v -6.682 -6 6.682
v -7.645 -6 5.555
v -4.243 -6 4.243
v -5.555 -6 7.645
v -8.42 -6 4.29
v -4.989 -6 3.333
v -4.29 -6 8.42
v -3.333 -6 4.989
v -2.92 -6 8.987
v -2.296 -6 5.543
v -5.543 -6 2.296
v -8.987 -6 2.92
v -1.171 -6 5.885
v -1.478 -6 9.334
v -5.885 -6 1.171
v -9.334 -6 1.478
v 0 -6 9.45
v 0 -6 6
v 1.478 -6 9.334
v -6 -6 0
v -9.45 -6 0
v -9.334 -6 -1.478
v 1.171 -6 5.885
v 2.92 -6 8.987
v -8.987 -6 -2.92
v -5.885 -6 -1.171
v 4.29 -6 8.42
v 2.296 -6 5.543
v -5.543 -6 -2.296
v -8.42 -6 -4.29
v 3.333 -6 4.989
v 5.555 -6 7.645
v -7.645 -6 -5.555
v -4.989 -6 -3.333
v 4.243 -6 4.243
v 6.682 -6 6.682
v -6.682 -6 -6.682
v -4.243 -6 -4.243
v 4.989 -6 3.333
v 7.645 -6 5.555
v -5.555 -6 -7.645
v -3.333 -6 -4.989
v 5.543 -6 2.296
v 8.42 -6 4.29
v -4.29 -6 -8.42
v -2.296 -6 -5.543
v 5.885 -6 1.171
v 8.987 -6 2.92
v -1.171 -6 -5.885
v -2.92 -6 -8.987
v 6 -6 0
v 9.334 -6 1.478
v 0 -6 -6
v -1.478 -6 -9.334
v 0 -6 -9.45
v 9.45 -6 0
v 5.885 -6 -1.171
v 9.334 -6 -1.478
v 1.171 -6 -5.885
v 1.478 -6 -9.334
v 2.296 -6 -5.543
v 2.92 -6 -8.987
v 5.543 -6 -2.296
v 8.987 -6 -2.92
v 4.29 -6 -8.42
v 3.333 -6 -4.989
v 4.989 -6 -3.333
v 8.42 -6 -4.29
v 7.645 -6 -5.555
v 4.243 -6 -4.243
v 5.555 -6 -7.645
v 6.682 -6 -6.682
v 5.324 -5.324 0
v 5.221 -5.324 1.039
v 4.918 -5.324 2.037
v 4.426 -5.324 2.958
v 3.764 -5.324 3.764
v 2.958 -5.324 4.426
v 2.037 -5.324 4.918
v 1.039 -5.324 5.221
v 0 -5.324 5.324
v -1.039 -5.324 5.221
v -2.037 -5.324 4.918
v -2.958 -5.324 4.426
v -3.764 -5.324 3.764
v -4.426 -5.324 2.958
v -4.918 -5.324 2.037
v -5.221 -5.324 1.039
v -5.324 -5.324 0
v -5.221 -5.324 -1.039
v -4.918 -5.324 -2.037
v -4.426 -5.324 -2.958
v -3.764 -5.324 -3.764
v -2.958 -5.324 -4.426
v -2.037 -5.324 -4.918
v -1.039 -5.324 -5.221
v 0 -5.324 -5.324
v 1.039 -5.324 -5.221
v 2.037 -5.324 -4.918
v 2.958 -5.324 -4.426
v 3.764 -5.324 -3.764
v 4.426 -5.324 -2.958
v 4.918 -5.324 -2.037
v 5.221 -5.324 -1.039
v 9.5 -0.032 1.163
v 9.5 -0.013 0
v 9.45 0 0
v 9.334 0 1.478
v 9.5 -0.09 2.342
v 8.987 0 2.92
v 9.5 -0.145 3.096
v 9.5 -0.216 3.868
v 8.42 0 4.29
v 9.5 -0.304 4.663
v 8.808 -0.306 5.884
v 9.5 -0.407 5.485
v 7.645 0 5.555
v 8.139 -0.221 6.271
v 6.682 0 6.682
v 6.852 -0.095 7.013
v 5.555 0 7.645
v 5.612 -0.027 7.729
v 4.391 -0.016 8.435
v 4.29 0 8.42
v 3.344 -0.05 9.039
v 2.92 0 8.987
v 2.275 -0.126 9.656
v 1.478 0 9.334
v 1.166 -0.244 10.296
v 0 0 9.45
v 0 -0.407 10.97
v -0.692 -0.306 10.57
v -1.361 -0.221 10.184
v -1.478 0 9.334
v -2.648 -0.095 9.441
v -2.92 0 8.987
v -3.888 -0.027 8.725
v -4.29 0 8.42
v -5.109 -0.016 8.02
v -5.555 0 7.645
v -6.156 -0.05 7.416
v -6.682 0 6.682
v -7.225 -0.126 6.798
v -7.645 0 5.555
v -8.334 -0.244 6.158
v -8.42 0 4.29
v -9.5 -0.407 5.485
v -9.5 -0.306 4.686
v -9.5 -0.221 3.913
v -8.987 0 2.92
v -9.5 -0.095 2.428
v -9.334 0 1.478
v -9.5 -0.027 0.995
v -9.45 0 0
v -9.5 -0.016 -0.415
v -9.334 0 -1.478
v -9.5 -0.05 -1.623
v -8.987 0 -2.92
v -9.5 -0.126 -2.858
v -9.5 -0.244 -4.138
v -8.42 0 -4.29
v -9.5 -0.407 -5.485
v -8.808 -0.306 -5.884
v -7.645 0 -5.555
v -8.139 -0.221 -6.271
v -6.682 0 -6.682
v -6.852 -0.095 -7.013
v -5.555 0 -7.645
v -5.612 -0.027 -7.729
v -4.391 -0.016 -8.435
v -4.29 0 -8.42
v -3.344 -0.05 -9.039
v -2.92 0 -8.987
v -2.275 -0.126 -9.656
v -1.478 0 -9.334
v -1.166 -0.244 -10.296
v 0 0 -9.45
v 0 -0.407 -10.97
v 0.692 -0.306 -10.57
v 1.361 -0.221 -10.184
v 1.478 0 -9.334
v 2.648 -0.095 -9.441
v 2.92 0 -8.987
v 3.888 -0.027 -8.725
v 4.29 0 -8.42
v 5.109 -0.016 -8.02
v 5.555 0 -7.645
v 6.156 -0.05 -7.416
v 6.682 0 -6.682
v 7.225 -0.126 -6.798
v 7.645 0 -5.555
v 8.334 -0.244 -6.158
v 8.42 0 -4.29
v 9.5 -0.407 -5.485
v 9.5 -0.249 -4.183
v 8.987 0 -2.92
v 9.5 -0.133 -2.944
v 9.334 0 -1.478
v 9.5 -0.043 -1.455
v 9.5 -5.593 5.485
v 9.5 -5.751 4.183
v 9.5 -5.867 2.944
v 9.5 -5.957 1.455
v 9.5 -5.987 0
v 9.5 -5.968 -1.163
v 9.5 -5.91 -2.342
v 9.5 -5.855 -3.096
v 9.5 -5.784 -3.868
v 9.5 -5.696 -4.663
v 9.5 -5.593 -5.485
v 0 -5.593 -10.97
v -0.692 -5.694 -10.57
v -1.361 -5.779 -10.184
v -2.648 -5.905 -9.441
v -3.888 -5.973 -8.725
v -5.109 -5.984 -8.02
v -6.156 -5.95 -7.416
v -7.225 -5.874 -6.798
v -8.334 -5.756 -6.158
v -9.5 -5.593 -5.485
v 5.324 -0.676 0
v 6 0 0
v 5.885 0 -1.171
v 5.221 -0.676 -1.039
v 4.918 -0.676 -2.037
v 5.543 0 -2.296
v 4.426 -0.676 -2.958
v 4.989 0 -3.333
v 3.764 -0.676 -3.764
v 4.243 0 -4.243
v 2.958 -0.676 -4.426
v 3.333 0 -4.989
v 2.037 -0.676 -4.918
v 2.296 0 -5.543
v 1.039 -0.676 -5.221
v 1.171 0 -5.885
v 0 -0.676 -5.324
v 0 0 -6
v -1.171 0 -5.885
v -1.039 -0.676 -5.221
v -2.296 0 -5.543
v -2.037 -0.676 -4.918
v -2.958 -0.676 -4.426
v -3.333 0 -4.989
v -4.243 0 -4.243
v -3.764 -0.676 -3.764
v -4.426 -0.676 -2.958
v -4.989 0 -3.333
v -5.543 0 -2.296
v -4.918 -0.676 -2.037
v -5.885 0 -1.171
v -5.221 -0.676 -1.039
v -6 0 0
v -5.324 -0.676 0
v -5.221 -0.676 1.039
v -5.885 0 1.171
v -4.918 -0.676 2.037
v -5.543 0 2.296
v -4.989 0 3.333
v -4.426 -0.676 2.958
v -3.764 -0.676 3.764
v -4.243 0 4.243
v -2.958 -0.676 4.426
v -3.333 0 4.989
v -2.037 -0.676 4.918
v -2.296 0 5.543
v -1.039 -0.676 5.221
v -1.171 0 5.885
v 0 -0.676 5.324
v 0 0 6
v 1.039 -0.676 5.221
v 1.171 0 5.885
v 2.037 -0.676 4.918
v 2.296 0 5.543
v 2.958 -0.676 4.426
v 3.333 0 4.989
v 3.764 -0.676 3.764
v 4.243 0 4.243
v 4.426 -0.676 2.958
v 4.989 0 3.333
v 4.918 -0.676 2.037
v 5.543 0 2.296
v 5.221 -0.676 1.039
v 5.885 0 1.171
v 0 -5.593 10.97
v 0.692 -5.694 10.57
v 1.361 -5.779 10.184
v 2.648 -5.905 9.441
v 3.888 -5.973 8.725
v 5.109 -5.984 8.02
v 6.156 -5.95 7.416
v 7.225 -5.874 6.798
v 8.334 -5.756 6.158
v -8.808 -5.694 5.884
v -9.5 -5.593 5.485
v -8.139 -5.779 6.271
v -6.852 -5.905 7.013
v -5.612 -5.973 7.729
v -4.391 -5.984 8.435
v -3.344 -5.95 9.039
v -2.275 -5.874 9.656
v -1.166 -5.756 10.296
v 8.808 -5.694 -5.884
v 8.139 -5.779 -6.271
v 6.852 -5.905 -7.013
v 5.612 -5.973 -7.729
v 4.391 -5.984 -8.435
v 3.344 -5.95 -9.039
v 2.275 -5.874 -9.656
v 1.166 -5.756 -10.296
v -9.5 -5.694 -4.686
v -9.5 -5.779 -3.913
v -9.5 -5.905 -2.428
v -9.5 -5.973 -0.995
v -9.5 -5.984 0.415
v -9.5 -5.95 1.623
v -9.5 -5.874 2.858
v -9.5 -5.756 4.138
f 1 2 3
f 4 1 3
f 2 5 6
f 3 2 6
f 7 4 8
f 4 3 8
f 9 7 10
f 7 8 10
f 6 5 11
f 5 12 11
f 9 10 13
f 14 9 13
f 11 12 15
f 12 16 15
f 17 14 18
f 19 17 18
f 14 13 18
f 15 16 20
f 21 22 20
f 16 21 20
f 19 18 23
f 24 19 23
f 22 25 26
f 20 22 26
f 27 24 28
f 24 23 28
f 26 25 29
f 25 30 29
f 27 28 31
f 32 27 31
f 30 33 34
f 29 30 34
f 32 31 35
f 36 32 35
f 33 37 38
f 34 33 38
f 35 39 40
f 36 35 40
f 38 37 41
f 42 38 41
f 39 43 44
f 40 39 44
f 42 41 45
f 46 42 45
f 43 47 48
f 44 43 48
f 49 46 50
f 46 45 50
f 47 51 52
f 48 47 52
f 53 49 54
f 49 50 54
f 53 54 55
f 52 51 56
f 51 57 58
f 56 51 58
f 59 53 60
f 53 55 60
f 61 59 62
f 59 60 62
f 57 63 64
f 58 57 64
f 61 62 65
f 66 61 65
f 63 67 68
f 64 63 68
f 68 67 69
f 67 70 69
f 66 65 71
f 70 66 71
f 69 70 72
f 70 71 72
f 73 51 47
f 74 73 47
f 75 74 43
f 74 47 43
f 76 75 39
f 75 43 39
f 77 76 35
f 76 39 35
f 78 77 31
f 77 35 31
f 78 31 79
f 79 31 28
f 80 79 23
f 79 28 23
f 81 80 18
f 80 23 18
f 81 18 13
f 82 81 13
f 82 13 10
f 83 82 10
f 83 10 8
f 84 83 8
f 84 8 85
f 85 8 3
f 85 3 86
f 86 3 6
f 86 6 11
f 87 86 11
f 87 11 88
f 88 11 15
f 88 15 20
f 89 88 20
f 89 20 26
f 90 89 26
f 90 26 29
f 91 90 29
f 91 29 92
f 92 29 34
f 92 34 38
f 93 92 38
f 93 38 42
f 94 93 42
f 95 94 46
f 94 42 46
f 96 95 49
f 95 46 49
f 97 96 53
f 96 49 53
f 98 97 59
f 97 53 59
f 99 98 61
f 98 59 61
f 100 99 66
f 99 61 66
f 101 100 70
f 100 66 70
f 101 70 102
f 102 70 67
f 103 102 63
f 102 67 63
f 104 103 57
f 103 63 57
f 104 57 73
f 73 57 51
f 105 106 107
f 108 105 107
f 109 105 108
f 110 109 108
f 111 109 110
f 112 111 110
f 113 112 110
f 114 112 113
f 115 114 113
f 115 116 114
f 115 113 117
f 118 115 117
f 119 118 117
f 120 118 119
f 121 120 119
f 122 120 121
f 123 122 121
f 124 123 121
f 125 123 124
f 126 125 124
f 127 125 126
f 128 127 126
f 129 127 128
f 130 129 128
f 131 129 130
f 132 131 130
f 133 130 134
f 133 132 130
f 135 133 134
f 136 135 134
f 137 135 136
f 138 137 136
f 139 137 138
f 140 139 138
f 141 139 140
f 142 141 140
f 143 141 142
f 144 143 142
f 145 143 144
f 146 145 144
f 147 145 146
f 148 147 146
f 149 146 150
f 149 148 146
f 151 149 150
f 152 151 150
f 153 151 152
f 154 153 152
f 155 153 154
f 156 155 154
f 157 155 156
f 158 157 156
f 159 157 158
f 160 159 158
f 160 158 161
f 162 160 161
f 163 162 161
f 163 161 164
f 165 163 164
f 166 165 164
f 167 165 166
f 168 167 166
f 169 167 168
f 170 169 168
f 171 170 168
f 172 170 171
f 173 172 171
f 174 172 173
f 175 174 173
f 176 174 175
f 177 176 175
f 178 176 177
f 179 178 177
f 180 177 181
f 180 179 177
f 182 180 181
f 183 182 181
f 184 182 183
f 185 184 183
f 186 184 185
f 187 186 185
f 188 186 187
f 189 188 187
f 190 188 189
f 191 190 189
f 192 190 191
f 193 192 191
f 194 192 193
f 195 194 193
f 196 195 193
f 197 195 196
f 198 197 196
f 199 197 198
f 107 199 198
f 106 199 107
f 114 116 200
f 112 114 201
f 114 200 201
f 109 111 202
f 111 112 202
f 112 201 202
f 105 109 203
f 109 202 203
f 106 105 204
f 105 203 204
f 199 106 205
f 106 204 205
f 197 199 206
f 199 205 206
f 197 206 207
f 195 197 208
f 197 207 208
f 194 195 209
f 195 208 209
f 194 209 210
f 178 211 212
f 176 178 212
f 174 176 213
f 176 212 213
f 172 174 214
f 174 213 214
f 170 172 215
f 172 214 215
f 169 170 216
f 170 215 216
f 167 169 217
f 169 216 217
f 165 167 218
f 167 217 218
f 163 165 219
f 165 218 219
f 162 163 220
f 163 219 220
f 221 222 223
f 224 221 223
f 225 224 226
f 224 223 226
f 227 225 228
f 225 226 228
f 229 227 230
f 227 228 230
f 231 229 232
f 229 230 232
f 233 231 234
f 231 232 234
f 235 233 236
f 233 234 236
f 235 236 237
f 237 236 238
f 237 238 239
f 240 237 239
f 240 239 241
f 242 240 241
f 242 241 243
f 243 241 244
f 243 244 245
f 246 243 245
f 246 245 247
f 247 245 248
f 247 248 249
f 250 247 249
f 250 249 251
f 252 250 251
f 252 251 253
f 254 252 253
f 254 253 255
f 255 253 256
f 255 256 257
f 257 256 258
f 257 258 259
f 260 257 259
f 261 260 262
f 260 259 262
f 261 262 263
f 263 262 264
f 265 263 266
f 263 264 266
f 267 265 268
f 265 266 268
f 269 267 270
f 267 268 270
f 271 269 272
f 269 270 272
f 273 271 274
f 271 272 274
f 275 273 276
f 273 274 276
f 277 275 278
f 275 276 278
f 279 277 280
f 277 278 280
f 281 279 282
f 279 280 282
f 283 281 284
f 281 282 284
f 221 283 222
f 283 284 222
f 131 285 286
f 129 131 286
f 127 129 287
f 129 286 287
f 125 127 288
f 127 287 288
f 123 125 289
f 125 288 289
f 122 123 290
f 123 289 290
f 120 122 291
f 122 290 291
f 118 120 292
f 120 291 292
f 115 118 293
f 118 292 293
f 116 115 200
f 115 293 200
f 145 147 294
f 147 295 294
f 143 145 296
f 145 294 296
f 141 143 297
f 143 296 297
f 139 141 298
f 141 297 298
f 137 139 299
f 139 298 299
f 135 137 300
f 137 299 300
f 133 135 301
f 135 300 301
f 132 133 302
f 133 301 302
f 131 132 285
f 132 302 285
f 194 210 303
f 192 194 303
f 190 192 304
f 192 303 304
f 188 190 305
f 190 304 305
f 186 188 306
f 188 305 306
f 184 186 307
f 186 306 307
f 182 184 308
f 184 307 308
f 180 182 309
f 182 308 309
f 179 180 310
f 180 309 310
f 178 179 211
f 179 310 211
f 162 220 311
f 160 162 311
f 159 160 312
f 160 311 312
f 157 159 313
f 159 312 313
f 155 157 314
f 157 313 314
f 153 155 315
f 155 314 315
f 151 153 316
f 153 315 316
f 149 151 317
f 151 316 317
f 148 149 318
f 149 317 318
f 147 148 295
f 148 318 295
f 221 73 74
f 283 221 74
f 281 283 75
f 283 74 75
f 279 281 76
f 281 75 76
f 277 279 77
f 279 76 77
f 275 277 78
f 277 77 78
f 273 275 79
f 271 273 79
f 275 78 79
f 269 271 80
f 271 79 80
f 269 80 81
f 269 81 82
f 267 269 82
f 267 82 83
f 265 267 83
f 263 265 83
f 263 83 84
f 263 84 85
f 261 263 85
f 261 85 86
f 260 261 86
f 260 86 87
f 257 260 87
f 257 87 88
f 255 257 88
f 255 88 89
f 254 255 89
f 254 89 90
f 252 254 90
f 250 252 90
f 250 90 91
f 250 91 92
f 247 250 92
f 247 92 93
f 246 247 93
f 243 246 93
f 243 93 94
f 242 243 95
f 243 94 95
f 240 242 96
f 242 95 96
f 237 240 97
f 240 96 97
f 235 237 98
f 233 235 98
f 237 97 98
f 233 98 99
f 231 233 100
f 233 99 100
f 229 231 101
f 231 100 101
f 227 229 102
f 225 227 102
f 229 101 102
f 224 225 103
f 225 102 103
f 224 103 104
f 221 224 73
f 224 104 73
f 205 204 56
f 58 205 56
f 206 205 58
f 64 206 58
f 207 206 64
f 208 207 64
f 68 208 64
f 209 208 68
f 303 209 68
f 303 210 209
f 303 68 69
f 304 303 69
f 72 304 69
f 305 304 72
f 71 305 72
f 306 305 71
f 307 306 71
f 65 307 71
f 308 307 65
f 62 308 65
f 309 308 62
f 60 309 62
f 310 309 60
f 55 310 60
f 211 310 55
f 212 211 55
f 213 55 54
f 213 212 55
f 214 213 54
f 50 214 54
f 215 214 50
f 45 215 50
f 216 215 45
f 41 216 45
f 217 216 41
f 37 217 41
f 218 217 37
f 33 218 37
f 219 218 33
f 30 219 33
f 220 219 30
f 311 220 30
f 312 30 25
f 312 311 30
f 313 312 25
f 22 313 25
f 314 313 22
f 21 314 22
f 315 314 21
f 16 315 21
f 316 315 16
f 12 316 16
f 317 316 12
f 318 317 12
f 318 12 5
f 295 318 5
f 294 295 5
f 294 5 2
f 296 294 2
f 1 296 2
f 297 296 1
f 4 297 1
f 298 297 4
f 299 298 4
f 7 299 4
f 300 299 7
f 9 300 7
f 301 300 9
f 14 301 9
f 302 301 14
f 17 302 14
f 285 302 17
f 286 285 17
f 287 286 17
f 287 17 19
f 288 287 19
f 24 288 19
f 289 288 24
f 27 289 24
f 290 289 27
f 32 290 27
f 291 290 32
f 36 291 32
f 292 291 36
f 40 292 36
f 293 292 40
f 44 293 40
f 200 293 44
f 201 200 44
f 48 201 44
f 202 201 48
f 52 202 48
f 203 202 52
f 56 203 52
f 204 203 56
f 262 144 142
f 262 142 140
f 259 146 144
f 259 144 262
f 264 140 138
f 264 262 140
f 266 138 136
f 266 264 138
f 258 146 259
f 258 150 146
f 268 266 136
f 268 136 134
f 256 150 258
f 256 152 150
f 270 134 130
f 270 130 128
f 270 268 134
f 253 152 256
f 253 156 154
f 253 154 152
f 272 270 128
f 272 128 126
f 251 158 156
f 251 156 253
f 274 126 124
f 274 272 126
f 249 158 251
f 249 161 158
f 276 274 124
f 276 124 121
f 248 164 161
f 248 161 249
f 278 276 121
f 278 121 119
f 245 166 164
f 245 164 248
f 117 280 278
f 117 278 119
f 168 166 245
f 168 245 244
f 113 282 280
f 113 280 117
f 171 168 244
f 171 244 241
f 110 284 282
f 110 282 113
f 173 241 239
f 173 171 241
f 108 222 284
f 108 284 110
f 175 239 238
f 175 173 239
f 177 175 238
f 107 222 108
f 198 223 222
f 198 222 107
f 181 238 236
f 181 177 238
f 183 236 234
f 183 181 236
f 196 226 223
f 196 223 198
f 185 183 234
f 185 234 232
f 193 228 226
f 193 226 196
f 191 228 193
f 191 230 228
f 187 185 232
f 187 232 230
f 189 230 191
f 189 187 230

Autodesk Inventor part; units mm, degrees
sketch "Sketch_1" plane through (0, 0, 0) normal (0, 0, 1) x (1, 0, 0)
  line L0 (0, -6) -> (0, 0)
  line L1 (0, 0) -> (9.45, 0)
  line L2 (9.45, 0) -> (20.6462, -3)
  line L3 (20.6462, -3) -> (9.45, -6)
  line L4 (9.45, -6) -> (0, -6)
  line L5 (0, -6) -> (0, 0)
revolve "Revolution1" add sketch "Sketch_1" angle 360 about axis through (0, -6, 0) along (0, 1, 0)
sketch "Sketch_2" plane through (0, 0, 0) normal (0, 1, 0) x (-1, 0, 0)
  line L0 (38, -38) -> (38, 38)
  line L1 (38, 38) -> (-38, 38)
  line L2 (-38, 38) -> (-38, -38)
  line L3 (-38, -38) -> (38, -38)
  line L4 (9.5, 5.4848) -> (0, 10.9697)
  line L5 (0, 10.9697) -> (-9.5, 5.4848)
  line L6 (-9.5, 5.4848) -> (-9.5, -5.4848)
  line L7 (-9.5, -5.4848) -> (0, -10.9697)
  line L8 (0, -10.9697) -> (9.5, -5.4848)
  line L9 (9.5, -5.4848) -> (9.5, 5.4848)
extrude "Extrusion1" cut sketch "Sketch_2" along normal mid plane 14
sketch "Sketch_3" plane through (0, 0, 0) normal (0, 0, 1) x (1, 0, 0)
  line L0 (0, -6) -> (0, 0)
  line L1 (0, 0) -> (6, 0)
  line L2 (6, 0) -> (5.3235, -0.6765)
  line L3 (5.3235, -0.6765) -> (5.3235, -5.3235)
  line L4 (5.3235, -5.3235) -> (6, -6)
  line L5 (6, -6) -> (0, -6)
  line L6 (0, -6) -> (0, 0)
revolve "Revolution2" cut sketch "Sketch_3" angle 360 about axis through (0, -6, 0) along (0, -1, 0)
thread "Thread1" size "M12x1.25" class "6H" standard "ISO Metric profile" full length
ref_plane "2CYL_XY" through (0, -3, 0) normal (0, 1, 0) x (1, 0, 0)
ref_plane "2CYL_YZ" through (0, -3, 0) normal (1, 0, 0) x (0, 0, -1)
ref_plane "2CYL_ZX" through (0, -3, 0) normal (0, 0, -1) x (0, 1, 0)
ref_plane "din439b_punkt_XY" through (0, 0, 0) normal (0, 1, 0) x (1, 0, 0)
ref_plane "din439b_punkt_YZ" through (0, 0, 0) normal (1, 0, 0) x (0, 0, -1)
ref_plane "din439b_punkt_ZX" through (0, 0, 0) normal (0, 0, -1) x (0, 1, 0)
properties part number "DIN-439-B - M12x1.25(F)"
